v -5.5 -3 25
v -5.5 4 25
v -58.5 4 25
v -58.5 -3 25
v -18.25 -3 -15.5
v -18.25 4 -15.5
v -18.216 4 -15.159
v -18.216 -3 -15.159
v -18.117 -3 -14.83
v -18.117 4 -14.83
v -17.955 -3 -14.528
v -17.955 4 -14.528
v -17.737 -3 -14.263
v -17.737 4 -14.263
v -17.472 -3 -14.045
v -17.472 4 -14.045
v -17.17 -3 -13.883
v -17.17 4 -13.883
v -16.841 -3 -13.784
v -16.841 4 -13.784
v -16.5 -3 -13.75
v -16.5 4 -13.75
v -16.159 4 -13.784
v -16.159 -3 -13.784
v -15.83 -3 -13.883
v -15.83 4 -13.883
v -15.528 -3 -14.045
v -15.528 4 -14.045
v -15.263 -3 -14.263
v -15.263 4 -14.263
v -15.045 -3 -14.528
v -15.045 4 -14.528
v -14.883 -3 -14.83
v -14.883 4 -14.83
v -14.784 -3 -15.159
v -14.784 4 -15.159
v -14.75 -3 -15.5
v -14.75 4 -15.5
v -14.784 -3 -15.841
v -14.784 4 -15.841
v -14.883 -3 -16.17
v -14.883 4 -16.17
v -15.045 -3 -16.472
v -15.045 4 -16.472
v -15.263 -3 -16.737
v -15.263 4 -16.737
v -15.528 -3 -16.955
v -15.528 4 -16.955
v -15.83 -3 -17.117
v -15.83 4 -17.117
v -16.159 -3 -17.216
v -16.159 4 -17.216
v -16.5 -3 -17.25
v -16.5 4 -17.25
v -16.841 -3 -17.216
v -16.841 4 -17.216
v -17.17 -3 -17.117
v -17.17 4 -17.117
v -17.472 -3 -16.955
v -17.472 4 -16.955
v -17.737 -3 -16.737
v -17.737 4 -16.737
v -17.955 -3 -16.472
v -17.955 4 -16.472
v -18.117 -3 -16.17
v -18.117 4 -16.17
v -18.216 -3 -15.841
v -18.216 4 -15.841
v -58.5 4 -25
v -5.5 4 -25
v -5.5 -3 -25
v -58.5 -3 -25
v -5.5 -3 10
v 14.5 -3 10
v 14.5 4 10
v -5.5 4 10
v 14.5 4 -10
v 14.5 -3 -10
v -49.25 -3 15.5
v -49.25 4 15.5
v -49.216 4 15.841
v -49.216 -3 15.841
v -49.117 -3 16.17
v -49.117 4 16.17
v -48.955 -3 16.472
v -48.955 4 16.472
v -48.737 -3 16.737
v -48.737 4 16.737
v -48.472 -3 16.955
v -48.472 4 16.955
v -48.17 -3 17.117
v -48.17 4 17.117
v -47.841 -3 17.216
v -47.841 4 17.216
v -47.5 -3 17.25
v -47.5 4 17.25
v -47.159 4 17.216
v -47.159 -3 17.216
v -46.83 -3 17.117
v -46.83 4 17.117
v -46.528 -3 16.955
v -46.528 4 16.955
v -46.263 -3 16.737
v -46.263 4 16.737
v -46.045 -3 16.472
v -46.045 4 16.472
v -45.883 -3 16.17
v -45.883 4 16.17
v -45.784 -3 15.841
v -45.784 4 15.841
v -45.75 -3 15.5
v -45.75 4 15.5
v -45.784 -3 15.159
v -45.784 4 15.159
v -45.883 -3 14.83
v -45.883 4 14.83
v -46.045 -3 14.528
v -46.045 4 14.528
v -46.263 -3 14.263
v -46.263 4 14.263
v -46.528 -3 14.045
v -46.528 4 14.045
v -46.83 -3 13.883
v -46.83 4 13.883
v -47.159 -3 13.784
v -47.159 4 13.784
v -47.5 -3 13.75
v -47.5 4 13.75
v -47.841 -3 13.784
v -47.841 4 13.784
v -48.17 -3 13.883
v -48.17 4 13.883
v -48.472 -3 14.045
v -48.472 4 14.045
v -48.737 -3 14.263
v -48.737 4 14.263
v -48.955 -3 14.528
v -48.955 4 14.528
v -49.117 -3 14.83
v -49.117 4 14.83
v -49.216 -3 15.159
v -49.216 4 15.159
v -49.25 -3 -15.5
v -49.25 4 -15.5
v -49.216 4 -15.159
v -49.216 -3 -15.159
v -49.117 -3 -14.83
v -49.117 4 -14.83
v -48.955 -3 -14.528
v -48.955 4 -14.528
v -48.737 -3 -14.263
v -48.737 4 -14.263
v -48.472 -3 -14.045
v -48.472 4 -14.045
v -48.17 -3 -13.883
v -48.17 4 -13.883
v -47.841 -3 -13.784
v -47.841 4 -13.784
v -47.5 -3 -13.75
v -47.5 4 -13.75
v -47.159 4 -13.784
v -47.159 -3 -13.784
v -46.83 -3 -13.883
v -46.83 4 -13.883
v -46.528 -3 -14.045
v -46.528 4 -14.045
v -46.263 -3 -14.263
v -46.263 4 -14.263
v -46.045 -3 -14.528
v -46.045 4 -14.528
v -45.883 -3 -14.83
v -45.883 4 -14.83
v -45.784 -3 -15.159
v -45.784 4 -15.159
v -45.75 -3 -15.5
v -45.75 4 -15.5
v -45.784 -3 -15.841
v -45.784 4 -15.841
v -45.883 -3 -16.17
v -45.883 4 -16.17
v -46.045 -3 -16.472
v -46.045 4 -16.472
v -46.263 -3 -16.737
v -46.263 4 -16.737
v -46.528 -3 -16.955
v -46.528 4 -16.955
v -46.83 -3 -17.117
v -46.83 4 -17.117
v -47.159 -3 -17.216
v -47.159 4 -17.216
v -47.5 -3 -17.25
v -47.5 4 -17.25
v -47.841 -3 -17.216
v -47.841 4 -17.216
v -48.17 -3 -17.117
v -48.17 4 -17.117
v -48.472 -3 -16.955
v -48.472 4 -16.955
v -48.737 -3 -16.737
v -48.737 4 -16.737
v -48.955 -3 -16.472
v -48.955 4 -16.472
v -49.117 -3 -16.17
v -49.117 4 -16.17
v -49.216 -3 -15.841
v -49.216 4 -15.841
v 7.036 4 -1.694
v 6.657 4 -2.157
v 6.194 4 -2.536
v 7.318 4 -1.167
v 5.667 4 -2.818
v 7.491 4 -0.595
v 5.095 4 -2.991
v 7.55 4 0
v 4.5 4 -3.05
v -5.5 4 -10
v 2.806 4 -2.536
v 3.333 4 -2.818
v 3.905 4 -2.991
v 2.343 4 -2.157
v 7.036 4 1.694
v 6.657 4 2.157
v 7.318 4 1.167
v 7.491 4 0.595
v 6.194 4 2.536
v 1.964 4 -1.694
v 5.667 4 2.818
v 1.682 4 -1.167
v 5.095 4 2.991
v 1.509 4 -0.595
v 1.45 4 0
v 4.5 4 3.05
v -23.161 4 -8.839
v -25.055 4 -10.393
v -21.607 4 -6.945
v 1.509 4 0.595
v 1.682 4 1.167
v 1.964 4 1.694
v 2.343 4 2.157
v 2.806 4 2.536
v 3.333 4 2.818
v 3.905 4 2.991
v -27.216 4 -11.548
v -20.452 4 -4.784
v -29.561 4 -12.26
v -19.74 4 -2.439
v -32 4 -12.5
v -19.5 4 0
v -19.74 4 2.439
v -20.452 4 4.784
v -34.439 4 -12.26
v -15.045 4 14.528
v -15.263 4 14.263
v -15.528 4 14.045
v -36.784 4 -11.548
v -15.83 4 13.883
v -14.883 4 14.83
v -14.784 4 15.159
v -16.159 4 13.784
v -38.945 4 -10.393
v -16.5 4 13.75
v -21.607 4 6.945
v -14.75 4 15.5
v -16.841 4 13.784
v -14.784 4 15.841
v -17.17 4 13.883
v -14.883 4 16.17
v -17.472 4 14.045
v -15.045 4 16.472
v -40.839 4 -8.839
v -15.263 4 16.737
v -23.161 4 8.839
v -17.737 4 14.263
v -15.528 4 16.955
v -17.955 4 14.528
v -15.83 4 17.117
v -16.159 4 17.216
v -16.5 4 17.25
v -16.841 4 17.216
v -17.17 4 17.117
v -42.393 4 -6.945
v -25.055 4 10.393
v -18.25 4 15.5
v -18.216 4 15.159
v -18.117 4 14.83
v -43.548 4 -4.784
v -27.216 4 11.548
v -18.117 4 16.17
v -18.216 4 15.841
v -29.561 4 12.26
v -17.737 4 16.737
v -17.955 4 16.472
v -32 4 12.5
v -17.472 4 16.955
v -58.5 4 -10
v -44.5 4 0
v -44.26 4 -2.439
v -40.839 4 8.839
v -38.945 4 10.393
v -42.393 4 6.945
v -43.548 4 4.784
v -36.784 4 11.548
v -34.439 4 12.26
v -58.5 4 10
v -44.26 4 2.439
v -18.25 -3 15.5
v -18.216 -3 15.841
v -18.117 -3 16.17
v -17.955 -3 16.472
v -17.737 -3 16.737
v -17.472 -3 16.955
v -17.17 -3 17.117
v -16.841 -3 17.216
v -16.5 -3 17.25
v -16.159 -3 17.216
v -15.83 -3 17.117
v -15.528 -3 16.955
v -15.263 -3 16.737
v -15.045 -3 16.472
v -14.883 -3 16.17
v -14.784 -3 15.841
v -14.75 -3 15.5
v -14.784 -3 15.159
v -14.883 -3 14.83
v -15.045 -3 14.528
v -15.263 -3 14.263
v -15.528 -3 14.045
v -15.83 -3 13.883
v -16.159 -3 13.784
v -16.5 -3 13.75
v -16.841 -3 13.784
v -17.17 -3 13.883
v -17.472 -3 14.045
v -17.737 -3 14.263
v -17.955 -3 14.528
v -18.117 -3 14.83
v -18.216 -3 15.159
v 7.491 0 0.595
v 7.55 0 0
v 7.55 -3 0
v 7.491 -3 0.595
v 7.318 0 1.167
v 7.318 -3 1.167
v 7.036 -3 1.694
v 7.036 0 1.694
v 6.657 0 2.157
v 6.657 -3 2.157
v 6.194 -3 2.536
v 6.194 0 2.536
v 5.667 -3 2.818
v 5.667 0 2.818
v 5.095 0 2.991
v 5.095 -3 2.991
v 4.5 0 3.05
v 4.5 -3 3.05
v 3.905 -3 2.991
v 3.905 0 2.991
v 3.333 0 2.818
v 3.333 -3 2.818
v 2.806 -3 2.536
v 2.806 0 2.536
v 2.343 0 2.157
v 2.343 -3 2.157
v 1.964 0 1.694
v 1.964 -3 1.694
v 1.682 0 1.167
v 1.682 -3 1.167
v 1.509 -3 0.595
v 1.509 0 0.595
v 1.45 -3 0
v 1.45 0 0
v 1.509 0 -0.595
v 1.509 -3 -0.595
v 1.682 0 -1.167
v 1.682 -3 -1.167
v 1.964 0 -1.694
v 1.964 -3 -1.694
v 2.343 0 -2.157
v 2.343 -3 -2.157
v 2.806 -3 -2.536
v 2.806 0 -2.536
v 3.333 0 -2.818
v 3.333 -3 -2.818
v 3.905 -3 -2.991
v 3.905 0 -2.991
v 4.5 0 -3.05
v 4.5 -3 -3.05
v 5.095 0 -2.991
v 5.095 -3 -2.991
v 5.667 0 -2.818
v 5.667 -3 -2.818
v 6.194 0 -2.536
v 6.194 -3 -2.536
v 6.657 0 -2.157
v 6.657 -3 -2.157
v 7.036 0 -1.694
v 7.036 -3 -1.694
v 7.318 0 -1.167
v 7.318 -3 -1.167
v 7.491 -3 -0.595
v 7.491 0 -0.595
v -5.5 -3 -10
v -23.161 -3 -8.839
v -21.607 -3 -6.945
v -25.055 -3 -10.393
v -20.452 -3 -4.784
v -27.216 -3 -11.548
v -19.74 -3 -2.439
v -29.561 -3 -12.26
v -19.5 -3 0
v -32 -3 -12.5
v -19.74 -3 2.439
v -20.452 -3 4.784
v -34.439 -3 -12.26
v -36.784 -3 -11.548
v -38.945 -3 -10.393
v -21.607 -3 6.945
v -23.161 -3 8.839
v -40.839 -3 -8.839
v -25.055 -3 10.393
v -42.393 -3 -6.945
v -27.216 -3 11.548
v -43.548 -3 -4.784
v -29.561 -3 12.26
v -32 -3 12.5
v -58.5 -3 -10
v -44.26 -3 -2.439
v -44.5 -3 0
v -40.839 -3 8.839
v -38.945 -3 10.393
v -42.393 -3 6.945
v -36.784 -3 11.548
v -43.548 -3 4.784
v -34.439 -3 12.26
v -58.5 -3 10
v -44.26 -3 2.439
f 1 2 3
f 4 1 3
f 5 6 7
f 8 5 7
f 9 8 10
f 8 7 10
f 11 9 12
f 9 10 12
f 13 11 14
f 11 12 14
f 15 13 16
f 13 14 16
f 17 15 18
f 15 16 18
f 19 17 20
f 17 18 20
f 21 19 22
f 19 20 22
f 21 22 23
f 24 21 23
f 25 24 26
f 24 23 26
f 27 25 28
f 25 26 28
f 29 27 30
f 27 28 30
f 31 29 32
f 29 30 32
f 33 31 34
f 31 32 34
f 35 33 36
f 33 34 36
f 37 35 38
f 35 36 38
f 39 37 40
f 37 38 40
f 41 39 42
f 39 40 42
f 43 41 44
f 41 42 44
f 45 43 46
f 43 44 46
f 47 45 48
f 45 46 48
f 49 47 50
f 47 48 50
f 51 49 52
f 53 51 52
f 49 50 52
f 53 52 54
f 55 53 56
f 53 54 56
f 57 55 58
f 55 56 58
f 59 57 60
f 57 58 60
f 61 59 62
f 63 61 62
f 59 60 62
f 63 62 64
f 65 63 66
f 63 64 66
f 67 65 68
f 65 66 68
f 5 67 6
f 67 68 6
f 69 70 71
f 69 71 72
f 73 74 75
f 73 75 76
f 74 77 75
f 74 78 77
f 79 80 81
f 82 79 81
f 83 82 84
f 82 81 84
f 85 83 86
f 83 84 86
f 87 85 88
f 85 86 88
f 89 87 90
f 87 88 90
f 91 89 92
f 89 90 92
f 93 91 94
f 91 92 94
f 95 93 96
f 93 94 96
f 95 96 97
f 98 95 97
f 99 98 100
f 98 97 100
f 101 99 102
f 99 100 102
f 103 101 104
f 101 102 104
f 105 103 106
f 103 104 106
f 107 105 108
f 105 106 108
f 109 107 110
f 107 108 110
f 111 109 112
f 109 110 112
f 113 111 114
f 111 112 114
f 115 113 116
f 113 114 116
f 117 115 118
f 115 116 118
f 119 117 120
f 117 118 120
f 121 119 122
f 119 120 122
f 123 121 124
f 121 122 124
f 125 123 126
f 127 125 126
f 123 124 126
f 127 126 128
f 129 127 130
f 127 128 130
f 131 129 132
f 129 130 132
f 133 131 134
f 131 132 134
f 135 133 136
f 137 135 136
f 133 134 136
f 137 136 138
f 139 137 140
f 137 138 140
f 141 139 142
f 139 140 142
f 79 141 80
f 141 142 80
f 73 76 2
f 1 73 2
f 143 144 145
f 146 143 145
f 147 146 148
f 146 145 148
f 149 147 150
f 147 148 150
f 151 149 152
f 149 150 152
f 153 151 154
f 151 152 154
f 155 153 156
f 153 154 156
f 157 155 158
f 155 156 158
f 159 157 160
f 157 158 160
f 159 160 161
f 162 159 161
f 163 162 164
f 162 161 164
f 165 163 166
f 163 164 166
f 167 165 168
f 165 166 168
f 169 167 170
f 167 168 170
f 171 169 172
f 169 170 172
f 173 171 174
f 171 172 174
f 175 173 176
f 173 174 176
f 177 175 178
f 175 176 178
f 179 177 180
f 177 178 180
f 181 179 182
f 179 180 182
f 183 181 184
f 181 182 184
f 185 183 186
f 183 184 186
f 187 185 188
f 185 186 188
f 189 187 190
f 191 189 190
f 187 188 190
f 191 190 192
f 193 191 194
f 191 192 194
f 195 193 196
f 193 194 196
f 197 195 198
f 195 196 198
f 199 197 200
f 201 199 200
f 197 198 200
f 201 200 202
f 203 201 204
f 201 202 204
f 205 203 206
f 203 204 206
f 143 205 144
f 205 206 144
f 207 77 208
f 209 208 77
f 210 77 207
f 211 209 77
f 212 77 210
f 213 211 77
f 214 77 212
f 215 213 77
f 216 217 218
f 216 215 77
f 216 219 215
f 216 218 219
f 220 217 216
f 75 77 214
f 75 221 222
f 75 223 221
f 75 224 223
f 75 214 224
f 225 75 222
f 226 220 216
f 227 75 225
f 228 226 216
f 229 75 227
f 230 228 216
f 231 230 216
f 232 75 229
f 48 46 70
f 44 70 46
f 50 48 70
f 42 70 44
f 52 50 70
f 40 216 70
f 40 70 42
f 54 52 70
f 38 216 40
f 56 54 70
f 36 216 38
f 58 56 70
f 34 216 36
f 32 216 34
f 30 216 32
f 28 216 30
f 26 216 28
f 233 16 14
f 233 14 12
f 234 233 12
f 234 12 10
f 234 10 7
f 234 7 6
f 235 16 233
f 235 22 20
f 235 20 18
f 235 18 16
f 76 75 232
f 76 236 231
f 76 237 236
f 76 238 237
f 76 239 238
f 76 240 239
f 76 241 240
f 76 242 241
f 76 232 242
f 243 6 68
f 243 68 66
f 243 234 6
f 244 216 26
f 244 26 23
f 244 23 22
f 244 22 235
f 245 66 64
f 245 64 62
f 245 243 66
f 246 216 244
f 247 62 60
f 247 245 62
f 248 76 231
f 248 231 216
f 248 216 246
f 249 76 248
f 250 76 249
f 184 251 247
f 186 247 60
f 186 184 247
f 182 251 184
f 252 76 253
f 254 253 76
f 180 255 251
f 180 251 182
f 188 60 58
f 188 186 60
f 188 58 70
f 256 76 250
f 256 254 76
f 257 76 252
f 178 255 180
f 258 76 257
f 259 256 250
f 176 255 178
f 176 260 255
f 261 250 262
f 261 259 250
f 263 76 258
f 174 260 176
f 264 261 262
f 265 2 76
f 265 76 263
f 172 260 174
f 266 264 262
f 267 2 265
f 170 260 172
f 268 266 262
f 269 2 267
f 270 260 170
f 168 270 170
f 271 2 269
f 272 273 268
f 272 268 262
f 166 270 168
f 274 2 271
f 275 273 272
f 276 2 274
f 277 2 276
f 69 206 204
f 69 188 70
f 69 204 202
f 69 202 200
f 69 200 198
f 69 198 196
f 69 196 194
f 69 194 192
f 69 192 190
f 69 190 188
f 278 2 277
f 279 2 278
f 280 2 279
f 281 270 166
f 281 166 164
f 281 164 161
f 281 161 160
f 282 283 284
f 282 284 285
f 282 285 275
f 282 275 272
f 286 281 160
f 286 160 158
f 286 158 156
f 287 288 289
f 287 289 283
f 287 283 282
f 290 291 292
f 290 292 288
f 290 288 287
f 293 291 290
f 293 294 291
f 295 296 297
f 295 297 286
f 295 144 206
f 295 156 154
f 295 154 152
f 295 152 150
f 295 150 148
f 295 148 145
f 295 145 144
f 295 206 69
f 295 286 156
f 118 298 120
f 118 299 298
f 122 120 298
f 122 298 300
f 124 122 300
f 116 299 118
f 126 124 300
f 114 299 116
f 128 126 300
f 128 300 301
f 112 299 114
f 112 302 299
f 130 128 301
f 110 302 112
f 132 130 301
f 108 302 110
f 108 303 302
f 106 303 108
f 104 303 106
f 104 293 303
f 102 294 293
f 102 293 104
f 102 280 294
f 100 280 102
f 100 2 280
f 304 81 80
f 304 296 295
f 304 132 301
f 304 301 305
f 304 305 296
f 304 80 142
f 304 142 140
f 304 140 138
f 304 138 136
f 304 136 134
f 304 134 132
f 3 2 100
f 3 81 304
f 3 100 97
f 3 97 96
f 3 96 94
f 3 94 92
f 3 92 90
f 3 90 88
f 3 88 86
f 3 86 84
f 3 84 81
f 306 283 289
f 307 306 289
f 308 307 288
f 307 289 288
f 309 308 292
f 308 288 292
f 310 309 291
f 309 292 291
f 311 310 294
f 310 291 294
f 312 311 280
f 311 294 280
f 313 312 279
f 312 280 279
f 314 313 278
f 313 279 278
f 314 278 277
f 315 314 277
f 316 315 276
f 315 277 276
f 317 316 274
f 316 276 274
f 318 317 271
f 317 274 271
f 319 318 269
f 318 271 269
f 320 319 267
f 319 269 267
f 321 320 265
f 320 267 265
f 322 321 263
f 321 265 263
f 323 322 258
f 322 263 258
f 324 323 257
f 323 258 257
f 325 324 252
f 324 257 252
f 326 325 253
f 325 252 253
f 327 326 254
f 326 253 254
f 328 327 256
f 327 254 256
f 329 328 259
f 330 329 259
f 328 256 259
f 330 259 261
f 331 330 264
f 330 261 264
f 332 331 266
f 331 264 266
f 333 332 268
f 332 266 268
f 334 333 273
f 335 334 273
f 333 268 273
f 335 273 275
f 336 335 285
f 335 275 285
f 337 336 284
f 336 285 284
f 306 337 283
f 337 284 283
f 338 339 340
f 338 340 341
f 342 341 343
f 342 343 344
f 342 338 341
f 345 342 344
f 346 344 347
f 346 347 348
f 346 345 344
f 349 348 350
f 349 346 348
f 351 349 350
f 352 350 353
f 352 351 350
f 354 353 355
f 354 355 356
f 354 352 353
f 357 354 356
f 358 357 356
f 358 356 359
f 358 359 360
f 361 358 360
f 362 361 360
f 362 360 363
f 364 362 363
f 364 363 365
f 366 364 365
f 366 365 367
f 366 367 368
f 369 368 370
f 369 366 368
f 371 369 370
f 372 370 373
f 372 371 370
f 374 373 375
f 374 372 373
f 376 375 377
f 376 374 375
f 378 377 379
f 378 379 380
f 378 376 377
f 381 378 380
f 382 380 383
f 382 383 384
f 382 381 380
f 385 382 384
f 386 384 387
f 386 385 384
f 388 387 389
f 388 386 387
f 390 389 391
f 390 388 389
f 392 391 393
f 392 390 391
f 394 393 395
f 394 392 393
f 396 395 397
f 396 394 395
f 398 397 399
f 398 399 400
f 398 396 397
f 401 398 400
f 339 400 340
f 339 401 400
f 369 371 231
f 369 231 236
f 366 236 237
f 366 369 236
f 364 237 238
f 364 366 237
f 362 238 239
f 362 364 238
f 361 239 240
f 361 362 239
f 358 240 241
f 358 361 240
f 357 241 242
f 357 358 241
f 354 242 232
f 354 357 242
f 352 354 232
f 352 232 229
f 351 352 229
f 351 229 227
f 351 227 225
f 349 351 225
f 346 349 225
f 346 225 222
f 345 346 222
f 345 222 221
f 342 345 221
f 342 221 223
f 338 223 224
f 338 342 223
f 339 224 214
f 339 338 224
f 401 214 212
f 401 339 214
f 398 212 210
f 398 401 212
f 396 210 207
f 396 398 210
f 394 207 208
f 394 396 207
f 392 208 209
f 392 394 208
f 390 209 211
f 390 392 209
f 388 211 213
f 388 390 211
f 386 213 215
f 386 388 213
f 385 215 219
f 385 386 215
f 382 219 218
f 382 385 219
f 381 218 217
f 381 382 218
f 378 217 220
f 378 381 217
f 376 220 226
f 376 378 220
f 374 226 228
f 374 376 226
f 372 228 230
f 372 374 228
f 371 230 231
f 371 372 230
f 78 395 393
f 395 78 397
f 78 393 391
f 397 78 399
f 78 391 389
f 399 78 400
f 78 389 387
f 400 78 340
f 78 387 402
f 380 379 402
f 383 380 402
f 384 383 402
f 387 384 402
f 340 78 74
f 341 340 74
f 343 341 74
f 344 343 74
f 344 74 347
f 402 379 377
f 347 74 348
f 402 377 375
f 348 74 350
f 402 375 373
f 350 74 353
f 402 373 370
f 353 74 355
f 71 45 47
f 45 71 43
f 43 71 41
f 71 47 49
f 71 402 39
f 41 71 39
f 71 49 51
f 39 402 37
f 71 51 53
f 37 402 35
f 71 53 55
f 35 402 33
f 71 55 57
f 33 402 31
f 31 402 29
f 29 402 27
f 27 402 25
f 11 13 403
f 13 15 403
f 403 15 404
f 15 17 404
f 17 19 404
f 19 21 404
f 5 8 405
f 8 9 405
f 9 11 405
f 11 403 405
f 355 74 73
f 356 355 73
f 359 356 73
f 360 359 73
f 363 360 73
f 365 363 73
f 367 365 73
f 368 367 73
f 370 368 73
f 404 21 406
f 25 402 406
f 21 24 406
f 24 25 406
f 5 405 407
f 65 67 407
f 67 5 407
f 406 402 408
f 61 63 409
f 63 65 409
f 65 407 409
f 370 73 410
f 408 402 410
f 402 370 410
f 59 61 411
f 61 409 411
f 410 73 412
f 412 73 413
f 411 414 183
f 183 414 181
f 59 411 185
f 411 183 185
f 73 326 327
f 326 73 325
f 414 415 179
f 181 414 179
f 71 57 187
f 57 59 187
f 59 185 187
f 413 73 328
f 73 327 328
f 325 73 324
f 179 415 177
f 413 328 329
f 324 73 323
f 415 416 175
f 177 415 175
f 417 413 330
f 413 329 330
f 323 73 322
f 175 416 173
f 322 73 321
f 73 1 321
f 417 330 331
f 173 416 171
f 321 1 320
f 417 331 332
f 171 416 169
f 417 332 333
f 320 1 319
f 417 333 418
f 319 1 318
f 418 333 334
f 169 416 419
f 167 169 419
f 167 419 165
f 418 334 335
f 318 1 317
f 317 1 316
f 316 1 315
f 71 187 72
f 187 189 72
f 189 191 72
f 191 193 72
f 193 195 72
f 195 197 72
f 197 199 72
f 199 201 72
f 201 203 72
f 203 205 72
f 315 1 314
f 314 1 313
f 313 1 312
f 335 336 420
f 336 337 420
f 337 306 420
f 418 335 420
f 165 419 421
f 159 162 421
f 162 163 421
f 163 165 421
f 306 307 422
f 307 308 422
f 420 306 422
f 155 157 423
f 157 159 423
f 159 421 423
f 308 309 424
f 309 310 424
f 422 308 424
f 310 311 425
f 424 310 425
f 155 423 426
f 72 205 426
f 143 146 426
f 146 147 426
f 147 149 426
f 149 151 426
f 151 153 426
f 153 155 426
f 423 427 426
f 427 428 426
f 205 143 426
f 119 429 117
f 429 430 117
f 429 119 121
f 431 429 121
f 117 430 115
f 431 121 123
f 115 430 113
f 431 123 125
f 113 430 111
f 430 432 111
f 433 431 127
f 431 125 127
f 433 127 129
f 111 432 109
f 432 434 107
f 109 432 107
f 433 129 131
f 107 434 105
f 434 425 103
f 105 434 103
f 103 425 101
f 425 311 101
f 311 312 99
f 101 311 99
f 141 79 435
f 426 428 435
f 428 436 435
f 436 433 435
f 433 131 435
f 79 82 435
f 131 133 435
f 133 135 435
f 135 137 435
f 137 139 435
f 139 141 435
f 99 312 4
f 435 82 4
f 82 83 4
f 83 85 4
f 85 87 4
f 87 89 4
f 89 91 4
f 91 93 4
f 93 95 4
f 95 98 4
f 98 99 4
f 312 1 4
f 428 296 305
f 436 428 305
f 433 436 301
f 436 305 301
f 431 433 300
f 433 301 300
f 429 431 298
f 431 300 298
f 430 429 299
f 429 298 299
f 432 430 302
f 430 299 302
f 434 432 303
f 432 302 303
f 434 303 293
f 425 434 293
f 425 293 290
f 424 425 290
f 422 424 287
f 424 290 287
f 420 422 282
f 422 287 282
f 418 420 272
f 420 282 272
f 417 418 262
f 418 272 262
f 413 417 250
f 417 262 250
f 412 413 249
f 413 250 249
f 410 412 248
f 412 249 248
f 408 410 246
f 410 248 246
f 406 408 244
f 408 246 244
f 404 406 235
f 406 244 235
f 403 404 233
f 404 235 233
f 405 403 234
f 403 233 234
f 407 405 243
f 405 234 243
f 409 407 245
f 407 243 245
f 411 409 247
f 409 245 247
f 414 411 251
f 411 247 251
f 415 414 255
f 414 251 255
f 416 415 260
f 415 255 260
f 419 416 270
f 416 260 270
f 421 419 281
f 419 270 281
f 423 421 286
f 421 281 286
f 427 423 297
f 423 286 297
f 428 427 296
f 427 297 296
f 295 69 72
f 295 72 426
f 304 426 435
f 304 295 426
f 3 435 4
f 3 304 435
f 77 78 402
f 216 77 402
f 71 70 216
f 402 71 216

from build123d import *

# Parameters (mm, degrees)
F0_W      = 32
F0_H      = 20
F0_R      = 3.05
F1_DEPTH  = 3
F2_W      = 32
F2_H      = 20
F2_R      = 3.05
F3_DEPTH  = 4
F5_W      = 12
F5_H      = 20
F6_DEPTH  = 7.001
F4_W      = 53
F4_H      = 50
F4_R      = 1.75
F4_R_2    = 12.5
F7_DEPTH  = 7
F10_W     = 38.6691533923
F10_H     = 26.006084159
F11_DEPTH = 12.5


with BuildPart() as f1:
    # F0 (on Front) → F1 (new body)
    with BuildSketch(Plane.XZ):
        with Locations((-1.5, 0)):
            Rectangle(F0_W, F0_H)
        with Locations((4.5, 0)):
            Circle(F0_R, mode=Mode.SUBTRACT)
    extrude(amount=F1_DEPTH)

    # F2 (on face) → F3 (join)
    with BuildSketch(Plane(origin=(0, 0, 0), x_dir=(-1, 0, 0), z_dir=(0, 1, 0))):
        with Locations((1.5, 0)):
            Rectangle(F2_W, F2_H)
        with Locations((-4.5, 0)):
            Circle(F2_R, mode=Mode.SUBTRACT)
    extrude(amount=F3_DEPTH)

    # F5 (on face) → F6 (cut, through all)
    with BuildSketch(Plane(origin=(0, 4, 0), x_dir=(-1, 0, 0), z_dir=(0, 1, 0))):
        with Locations((11.5, 0)):
            Rectangle(F5_W, F5_H)
    extrude(amount=-F6_DEPTH, mode=Mode.SUBTRACT)

    # F4 (on face) → F7 (join)
    with BuildSketch(Plane(origin=(0, 4, 0), x_dir=(-1, 0, 0), z_dir=(0, 1, 0))):
        with Locations((32, 0)):
            Rectangle(F4_W, F4_H)
        with Locations((16.5, -15.5)):
            Circle(F4_R, mode=Mode.SUBTRACT)
        with Locations((47.5, -15.5)):
            Circle(F4_R, mode=Mode.SUBTRACT)
        with Locations((16.5, 15.5)):
            Circle(F4_R, mode=Mode.SUBTRACT)
        with Locations((32, 0)):
            Circle(F4_R_2, mode=Mode.SUBTRACT)
        with Locations((47.5, 15.5)):
            Circle(F4_R, mode=Mode.SUBTRACT)
    extrude(amount=-F7_DEPTH)

    # F9: F1 across plane


with BuildPart() as f1_1:
    add(f1.part)
    add(f1.part.mirror(Plane.YZ.offset(-32)))

    # F10 (on Front) → F11 (cut, symmetric)
    with BuildSketch(Plane.XZ):
        with Locations((-77.8345766962, -3.0030420795)):
            Rectangle(F10_W, F10_H)
    extrude(amount=F11_DEPTH, both=True, mode=Mode.SUBTRACT)


solid = f1_1.part
